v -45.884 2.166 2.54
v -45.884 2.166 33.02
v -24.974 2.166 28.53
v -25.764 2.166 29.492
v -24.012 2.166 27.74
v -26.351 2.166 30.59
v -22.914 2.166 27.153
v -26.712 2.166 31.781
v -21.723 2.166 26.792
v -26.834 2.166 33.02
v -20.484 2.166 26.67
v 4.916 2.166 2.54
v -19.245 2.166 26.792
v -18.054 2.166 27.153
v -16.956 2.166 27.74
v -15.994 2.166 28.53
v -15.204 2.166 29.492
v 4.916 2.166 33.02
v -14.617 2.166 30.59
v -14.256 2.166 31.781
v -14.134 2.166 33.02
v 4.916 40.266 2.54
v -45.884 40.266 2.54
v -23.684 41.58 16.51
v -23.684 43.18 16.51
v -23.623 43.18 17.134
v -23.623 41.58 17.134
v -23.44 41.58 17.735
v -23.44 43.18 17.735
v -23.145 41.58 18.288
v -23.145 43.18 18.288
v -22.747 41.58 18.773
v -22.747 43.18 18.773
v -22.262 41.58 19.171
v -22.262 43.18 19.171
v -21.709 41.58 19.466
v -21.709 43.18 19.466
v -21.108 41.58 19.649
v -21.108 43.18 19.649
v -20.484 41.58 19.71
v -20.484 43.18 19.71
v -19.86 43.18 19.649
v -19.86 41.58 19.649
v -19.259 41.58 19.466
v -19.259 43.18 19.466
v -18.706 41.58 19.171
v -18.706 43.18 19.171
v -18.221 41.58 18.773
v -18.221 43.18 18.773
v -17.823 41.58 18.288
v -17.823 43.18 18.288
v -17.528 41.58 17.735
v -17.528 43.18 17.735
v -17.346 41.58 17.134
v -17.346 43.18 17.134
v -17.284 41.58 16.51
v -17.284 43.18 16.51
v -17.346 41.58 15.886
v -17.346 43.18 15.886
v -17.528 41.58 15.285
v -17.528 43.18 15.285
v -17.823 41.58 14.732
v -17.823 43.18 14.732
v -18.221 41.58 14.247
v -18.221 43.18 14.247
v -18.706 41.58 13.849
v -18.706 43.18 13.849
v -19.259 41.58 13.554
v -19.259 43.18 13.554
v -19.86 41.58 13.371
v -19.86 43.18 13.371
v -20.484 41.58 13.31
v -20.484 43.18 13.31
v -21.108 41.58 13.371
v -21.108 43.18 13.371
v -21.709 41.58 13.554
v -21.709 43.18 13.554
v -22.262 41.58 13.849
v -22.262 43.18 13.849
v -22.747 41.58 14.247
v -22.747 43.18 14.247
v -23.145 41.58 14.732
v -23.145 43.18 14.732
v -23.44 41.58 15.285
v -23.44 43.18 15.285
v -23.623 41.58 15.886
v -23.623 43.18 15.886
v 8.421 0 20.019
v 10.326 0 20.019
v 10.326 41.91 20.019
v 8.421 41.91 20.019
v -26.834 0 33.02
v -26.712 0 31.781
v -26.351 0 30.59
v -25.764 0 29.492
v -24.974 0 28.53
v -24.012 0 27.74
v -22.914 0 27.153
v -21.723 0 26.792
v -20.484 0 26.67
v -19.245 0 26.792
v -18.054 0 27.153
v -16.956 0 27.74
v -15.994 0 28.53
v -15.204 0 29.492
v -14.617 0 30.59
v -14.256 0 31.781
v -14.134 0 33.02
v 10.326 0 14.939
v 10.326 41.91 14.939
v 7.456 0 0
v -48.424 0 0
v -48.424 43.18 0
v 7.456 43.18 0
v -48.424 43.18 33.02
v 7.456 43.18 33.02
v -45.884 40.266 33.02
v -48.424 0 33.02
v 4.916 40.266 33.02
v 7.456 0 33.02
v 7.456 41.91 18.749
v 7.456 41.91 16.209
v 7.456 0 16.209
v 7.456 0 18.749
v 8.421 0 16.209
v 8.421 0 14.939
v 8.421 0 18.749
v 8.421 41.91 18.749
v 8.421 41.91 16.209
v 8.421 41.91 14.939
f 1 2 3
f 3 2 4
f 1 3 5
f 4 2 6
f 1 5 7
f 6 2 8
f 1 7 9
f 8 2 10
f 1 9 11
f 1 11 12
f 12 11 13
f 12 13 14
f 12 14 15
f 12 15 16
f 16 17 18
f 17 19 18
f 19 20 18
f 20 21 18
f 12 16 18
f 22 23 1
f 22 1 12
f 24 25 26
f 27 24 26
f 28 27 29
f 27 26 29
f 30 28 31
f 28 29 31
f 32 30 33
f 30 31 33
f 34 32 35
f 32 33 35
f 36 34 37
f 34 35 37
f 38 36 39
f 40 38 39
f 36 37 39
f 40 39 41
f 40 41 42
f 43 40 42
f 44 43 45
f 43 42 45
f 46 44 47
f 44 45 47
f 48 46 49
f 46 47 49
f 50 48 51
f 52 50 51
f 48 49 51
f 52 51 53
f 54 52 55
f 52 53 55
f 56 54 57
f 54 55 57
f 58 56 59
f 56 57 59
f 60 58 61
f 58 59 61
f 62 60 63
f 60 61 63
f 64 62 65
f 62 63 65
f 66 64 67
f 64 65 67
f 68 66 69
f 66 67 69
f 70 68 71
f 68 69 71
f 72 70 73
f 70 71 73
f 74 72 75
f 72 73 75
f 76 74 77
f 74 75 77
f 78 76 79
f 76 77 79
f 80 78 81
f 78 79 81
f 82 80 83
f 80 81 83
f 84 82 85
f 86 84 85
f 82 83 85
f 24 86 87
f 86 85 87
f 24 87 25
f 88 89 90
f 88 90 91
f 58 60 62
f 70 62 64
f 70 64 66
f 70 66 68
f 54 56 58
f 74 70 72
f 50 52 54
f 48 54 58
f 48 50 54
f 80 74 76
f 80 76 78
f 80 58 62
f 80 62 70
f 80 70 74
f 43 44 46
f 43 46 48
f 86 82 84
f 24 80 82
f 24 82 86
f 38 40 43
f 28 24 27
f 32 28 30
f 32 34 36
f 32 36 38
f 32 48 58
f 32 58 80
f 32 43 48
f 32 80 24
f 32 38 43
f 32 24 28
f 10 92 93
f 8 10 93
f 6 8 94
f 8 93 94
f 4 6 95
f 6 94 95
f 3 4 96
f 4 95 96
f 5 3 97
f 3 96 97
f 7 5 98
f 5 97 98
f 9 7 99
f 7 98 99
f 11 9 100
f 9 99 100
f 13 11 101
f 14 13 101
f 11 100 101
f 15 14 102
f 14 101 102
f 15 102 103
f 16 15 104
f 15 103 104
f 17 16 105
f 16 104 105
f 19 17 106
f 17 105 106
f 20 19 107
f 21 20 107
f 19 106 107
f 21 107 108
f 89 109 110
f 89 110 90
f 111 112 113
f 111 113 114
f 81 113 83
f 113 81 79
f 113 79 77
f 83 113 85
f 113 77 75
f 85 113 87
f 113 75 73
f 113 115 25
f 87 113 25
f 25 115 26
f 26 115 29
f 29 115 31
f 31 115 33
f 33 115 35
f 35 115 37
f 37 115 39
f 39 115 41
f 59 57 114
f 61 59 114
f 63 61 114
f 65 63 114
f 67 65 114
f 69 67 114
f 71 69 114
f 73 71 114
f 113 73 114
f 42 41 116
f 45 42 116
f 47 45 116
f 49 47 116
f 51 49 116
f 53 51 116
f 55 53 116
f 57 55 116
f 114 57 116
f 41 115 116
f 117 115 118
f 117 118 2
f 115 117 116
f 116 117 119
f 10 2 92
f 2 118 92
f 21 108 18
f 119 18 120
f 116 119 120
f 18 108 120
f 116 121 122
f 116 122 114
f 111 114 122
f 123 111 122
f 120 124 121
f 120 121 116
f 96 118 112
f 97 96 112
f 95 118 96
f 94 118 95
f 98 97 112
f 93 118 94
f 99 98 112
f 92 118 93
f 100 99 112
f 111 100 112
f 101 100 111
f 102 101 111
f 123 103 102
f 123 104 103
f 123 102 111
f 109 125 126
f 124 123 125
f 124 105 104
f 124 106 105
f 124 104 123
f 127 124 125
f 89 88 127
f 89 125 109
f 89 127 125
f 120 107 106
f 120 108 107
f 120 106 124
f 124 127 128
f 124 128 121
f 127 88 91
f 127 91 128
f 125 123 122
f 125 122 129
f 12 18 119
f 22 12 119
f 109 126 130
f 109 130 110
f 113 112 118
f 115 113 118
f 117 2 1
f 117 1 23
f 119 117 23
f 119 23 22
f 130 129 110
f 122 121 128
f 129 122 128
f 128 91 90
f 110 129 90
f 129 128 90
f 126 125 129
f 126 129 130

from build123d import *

# Parameters (mm, degrees)
F0_W     = 55.88
F0_H     = 33.02
F1_DEPTH = 43.18
F2_W     = 50.8
F2_H     = 38.1
F3_DEPTH = 30.48
F4_R     = 6.35
F5_DEPTH = 25.4
F6_R     = 3.2
F7_DEPTH = 1.6002
F9_DEPTH = 41.91


with BuildPart() as f1:
    # F0 (on Front) → F1 (new body)
    with BuildSketch(Plane.XZ):
        with Locations((-20.484024, 16.51)):
            Rectangle(F0_W, F0_H)
    extrude(amount=-F1_DEPTH)

    # F2 (on face) → F3 (cut)
    with BuildSketch(Plane.XY.offset(33.02)):
        with Locations((-20.484024, 21.216264)):
            Rectangle(F2_W, F2_H)
    extrude(amount=-F3_DEPTH, mode=Mode.SUBTRACT)

    # F4 (on face) → F5 (cut)
    with BuildSketch(Plane.XZ):
        with Locations((-20.484024, 33.02)):
            Circle(F4_R)
    extrude(amount=-F5_DEPTH, mode=Mode.SUBTRACT)

    # F6 (on face) → F7 (cut)
    with BuildSketch(Plane(origin=(0, 43.18, 0), x_dir=(-1, 0, 0), z_dir=(0, 1, 0))):
        with Locations((20.484024, 16.51)):
            Circle(F6_R)
    extrude(amount=-F7_DEPTH, mode=Mode.SUBTRACT)

    # F8 (on face) → F9 (join)
    with BuildSketch(Plane.XZ):
        Polygon((8.421195, 20.018721), (8.421195, 18.748721), (7.455976, 18.748721), (7.455976, 16.208721), (8.421195, 16.208721), (8.421195, 14.938721), (10.326195, 14.938721), (10.326195, 20.018721), align=None)
    extrude(amount=-F9_DEPTH)


solid = f1.part
